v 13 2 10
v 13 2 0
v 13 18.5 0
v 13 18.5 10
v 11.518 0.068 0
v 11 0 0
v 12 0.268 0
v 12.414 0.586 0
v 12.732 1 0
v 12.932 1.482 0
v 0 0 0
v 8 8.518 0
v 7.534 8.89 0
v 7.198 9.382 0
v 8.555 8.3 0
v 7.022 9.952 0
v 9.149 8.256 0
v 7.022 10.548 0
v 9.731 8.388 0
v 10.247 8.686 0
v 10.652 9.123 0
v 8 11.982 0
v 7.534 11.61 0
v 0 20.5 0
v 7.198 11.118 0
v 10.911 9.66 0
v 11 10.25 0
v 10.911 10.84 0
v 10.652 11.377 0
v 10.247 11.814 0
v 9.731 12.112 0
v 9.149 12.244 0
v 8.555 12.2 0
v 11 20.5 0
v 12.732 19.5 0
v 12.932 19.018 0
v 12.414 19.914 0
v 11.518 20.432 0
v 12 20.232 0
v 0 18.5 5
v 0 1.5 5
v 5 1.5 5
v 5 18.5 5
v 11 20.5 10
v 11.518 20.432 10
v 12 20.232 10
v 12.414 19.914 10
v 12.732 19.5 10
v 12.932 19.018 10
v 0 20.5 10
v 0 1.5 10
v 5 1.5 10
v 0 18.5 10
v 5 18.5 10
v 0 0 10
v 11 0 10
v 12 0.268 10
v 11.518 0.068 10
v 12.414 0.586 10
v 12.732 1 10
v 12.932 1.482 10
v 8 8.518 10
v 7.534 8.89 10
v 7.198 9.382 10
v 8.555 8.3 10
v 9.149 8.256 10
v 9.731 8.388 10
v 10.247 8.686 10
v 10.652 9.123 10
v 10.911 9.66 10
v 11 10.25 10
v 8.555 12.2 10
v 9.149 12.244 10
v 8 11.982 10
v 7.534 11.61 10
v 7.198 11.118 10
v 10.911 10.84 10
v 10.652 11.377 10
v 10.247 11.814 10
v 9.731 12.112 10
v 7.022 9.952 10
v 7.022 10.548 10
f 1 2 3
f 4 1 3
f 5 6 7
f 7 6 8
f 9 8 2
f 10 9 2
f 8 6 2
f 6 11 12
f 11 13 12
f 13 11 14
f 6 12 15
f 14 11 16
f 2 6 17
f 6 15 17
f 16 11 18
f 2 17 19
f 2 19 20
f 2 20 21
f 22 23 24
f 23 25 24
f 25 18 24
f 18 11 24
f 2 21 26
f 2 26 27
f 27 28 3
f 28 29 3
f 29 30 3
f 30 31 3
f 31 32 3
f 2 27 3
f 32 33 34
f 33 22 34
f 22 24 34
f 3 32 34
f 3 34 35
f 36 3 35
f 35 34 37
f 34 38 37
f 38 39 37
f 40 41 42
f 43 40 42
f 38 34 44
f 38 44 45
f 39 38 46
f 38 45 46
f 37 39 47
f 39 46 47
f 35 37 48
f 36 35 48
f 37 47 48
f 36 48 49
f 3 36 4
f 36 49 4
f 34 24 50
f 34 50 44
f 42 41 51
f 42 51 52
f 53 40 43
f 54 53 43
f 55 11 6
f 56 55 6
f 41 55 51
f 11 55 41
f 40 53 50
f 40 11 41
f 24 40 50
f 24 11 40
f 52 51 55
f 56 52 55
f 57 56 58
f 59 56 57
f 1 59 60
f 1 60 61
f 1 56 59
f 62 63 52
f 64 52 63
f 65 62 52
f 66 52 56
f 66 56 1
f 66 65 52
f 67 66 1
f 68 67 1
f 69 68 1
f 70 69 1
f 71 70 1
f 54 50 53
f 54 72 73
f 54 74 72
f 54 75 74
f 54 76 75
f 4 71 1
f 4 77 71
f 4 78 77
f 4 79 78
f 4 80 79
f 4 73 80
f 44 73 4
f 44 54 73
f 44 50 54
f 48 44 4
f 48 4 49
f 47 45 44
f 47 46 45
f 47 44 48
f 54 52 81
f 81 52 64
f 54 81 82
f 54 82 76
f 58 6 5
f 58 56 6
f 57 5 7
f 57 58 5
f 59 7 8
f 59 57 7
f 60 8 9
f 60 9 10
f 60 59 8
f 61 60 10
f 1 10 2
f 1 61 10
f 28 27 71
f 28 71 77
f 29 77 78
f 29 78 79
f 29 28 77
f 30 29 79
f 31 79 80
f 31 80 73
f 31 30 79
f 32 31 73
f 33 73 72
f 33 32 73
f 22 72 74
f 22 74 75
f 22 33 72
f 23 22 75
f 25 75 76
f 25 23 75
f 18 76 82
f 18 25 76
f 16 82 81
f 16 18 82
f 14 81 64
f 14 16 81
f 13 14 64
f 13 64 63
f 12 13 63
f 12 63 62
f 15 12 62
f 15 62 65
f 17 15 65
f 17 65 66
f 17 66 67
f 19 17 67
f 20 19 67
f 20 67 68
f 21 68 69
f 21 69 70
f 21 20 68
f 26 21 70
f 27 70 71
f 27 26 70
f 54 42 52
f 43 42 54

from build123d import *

# Parameters (mm, degrees)
CYLINDER_R     = 2
CYLINDER_DEPTH = 10
BOX_W          = 5
BOX_H          = 17
BOX_DEPTH      = 5
BOX001_W       = 13
BOX001_H       = 20.5
BOX001_DEPTH   = 10
FILLET_R       = 2


with BuildPart() as cylinder:
    # Cylinder → Cylinder (new body)
    with BuildSketch(Plane(origin=(9, 10.25, 0), x_dir=(1, 0, 0), z_dir=(0, 0, 1))):
        Circle(CYLINDER_R)
    extrude(amount=CYLINDER_DEPTH)


with BuildPart() as cube:
    # Box → Box (new body)
    with BuildSketch(Plane(origin=(0, 1.5, 5), x_dir=(1, 0, 0), z_dir=(0, 0, 1))):
        with Locations((2.5, 8.5)):
            Rectangle(BOX_W, BOX_H)
    extrude(amount=BOX_DEPTH)


with BuildPart() as fillet_body:
    # Box001 → Box001 (new body)
    with BuildSketch(Plane.XY):
        with Locations((6.5, 10.25)):
            Rectangle(BOX001_W, BOX001_H)
    extrude(amount=BOX001_DEPTH)

    # Cut: cut Cube
    add(cube.part, mode=Mode.SUBTRACT)

    # Cut001: cut Cylinder
    add(cylinder.part, mode=Mode.SUBTRACT)

    # Fillet
    fillet_edges = [fillet_body.edges().sort_by_distance(p)[0] for p in [
        (13, 20.5, 5),
        (13, 0, 5),
    ]]
    fillet(fillet_edges, radius=FILLET_R)


solid = fillet_body.part
